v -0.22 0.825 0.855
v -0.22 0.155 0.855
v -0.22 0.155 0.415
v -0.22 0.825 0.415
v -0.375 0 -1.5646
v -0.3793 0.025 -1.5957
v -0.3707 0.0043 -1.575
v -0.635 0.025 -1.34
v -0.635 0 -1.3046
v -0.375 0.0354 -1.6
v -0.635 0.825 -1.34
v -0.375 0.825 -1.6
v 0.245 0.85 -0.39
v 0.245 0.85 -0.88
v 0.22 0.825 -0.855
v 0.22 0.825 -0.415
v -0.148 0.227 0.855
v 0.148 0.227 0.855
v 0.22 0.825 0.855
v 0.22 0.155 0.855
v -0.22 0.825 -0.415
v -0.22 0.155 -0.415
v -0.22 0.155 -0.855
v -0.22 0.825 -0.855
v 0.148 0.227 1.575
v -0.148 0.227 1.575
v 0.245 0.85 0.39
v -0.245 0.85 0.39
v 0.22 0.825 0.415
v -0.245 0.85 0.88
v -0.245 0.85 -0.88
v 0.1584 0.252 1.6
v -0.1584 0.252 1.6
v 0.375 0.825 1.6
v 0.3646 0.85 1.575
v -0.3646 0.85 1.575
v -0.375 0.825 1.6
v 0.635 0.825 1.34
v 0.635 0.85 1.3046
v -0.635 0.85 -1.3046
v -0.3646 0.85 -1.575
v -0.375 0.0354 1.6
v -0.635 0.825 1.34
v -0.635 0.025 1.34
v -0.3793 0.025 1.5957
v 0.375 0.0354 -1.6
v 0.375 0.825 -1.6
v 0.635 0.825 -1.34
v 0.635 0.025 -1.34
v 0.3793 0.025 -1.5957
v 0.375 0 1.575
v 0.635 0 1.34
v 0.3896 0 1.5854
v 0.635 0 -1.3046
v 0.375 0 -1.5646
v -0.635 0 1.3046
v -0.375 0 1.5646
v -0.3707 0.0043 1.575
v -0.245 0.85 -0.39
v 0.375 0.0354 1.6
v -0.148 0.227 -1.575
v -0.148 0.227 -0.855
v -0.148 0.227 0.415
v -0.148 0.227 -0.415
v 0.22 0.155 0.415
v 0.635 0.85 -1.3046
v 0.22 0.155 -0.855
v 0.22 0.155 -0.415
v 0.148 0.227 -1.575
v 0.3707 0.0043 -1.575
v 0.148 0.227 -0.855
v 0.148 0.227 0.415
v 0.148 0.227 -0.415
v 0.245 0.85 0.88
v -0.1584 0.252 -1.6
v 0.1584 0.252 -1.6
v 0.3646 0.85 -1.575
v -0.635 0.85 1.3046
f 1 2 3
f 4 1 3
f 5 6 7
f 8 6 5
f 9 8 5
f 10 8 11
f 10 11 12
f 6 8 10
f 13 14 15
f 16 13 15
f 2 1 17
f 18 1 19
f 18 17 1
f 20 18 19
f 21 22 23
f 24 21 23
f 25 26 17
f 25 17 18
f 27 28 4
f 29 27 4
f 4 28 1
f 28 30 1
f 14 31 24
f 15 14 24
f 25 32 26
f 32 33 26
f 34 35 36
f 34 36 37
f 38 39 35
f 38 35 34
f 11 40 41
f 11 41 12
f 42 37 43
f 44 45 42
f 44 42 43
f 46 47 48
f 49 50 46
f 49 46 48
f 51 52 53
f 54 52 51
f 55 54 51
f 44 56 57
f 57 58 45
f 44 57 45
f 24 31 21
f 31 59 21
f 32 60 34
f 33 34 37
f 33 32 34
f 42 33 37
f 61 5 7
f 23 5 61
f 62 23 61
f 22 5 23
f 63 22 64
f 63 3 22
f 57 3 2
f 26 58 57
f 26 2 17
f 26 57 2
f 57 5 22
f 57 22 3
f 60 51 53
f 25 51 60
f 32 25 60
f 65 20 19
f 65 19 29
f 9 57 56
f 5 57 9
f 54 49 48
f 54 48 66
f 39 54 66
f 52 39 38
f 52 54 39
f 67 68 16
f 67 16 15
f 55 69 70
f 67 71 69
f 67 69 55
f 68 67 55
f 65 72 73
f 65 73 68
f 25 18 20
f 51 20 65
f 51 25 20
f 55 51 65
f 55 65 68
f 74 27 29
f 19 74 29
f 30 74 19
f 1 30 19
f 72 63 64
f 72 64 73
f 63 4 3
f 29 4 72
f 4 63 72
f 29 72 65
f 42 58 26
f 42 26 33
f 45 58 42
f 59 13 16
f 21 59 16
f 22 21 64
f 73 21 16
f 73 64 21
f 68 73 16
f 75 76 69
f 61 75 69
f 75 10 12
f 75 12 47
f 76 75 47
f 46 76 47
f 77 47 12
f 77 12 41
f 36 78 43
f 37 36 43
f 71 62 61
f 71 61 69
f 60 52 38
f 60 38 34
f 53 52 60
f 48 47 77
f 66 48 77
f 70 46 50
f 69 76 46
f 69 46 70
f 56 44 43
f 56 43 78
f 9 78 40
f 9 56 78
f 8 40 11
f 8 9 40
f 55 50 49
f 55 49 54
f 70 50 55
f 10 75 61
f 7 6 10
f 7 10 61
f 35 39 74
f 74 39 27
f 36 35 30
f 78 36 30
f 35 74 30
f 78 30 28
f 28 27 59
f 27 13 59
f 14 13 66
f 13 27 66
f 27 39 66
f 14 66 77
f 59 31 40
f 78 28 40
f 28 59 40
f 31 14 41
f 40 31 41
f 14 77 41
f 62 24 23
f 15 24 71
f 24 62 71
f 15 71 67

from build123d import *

# Parameters (mm, degrees)
SKETCH5_W           = 0.44
SKETCH5_H           = 0.44
BOSS_EXTRUDE1_DEPTH = 0.85
CUT_EXTRUDE1_REACH  = 5.371
CHAMFER1_SIZE       = 0.025


with BuildPart() as part:
    # Sketch5 → Boss-Extrude1 (new body)
    with BuildSketch(Plane(origin=(0, 0, 0), x_dir=(1, 0, 0), z_dir=(0, 1, 0))):
        Polygon((-0.375, 1.6), (0.375, 1.6), (0.635, 1.34), (0.635, -1.34), (0.375, -1.6), (-0.375, -1.6), (-0.635, -1.34), (-0.635, 1.34), align=None)
        with Locations((0, 0.635)):
            Rectangle(SKETCH5_W, SKETCH5_H, mode=Mode.SUBTRACT)
        with Locations((0, -0.635)):
            Rectangle(SKETCH5_W, SKETCH5_H, mode=Mode.SUBTRACT)
    extrude(amount=BOSS_EXTRUDE1_DEPTH)

    # Cut-Extrude1: up to this face of the body (flat: up to its plane)
    cut_extrude1_end = Plane(part.part.faces().sort_by_distance((0, 0.425, -1.6))[0])
    # Sketch6 → Cut-Extrude1 (cut, up to the picked face)
    with BuildSketch(Plane.XY.offset(1.6), mode=Mode.PRIVATE) as cut_extrude1_sk1:
        Polygon((-0.375, 0), (-0.148, 0.227), (0.148, 0.227), (0.375, 0), align=None)
    cut_extrude1_tool1 = split(extrude(cut_extrude1_sk1.sketch, amount=-CUT_EXTRUDE1_REACH, mode=Mode.PRIVATE), bisect_by=cut_extrude1_end, keep=Keep.BOTH, mode=Mode.PRIVATE)
    add(cut_extrude1_tool1.solids().sort_by(Axis((0, 0.097079, 1.6), (0, 0, -1)))[0], mode=Mode.SUBTRACT)

    # Chamfer1
    # the kernel refuses this chamfer: 0.025 mm, written as the material it takes off along each edge
    with BuildSketch(Plane(origin=(-0.329538638, 0, 1.645461362), x_dir=(0.7068394360706735, -0.027495876610586514, -0.7068394360706735), z_dir=(-0.7071067811865476, 0, -0.7071067811865476)), Plane(origin=(0.329538638, 0.85, -1.645461362), x_dir=(0.019442520806015277, -0.9996219169112966, -0.01944252080601526), z_dir=(0.7071067811865472, 0, 0.7071067811865479))) as chamfer1_piece_1:
        Polygon((CHAMFER1_SIZE * 0.999621916911, -CHAMFER1_SIZE * 0.0274958766106), (-CHAMFER1_SIZE * 0.0274958766106, -CHAMFER1_SIZE * 0.999621916911), (0, 0), align=None)
    extrude(amount=0.496279676, mode=Mode.SUBTRACT)
    with BuildSketch(Plane(origin=(-0.680461362, 0, -1.294538638), x_dir=(-0.01944252080601428, 0.9996219169112966, -0.019442520806014163), z_dir=(0.7071067811865455, 0, -0.7071067811865497)), Plane(origin=(-0.329538638, 0.85, 1.645461362), x_dir=(0.7068394360706735, 0.027495876610587406, -0.7068394360706735), z_dir=(-0.7071067811865476, 0, -0.7071067811865476)), Plane(origin=(0.680461362, 0.85, 1.294538638), x_dir=(-0.7068394360706735, 0.02749587661058749, -0.7068394360706735), z_dir=(-0.7071067811865476, 0, 0.7071067811865476)), Plane(origin=(-0.680461362, 0.85, -1.294538638), x_dir=(0.7068394360706755, 0.02749587661058732, 0.7068394360706715), z_dir=(0.7071067811865455, 0, -0.7071067811865497)), Plane(origin=(0.329538638, 0, -1.645461362), x_dir=(0.019442520806010995, 0.9996219169112968, -0.019442520806010978), z_dir=(0.7071067811865472, 0, 0.7071067811865479))) as chamfer1_piece_2:
        Polygon((CHAMFER1_SIZE * 0.999621916911, CHAMFER1_SIZE * 0.0274958766106), (-CHAMFER1_SIZE * 0.0274958766106, CHAMFER1_SIZE * 0.999621916911), (0, 0), align=None)
    extrude(amount=0.496279676, mode=Mode.SUBTRACT)
    with BuildSketch(Plane(origin=(0.439292075, 0.85, 1.6), x_dir=(0, 0.02749587661058742, -0.9996219169112966), z_dir=(-1, 0, 0))) as chamfer1_piece_3:
        Polygon((CHAMFER1_SIZE * 0.999621916911, CHAMFER1_SIZE * 0.0274958766106), (-CHAMFER1_SIZE * 0.0274958766106, CHAMFER1_SIZE * 0.999621916911), (0, 0), align=None)
    extrude(amount=0.878584149, mode=Mode.SUBTRACT)
    with BuildSketch(Plane(origin=(0.22, 0.85, -0.855), x_dir=(0.9996219169112966, 0.02749587661058736, 0), z_dir=(0, 0, 1)), Plane(origin=(-0.22, 0.85, -0.855), x_dir=(0, 0.027495876610587302, -0.9996219169112966), z_dir=(1, 0, 0)), Plane(origin=(-0.22, 0.85, -0.415), x_dir=(-0.9996219169112966, 0.02749587661058736, 0), z_dir=(0, 0, -1)), Plane(origin=(0.22, 0.85, -0.415), x_dir=(0, 0.027495876610587302, 0.9996219169112966), z_dir=(-1, 0, 0)), Plane(origin=(-0.22, 0.85, 0.855), x_dir=(-0.9996219169112966, 0.02749587661058736, 0), z_dir=(0, 0, -1)), Plane(origin=(0.22, 0.85, 0.855), x_dir=(0, 0.027495876610587302, 0.9996219169112966), z_dir=(-1, 0, 0)), Plane(origin=(0.22, 0.85, 0.415), x_dir=(0.9996219169112966, 0.02749587661058736, 0), z_dir=(0, 0, 1)), Plane(origin=(-0.22, 0.85, 0.415), x_dir=(0, 0.027495876610587302, -0.9996219169112966), z_dir=(1, 0, 0))) as chamfer1_piece_4:
        Polygon((CHAMFER1_SIZE * 0.999621916911, -CHAMFER1_SIZE * 0.0274958766106), (-CHAMFER1_SIZE * 0.0274958766106, -CHAMFER1_SIZE * 0.999621916911), (0, 0), align=None)
    extrude(amount=0.44, mode=Mode.SUBTRACT)
    with BuildSketch(Plane(origin=(-0.439292075, 0.85, -1.6), x_dir=(0, -0.9996219169112966, -0.027495876610587302), z_dir=(1, 0, 0))) as chamfer1_piece_5:
        Polygon((CHAMFER1_SIZE * 0.999621916911, -CHAMFER1_SIZE * 0.0274958766106), (-CHAMFER1_SIZE * 0.0274958766106, -CHAMFER1_SIZE * 0.999621916911), (0, 0), align=None)
    extrude(amount=0.878584149, mode=Mode.SUBTRACT)
    with BuildSketch(Plane(origin=(0.102538638, 0.272461362, 1.6), x_dir=(-0.019442520806014184, -0.01944252080601436, -0.9996219169112966), z_dir=(0.7071067811865508, -0.7071067811865442, 0))) as chamfer1_piece_6_section:
        Polygon((CHAMFER1_SIZE * 0.999621916911, CHAMFER1_SIZE * 0.0274958766106), (-CHAMFER1_SIZE * 0.0274958766106, CHAMFER1_SIZE * 0.999621916911), (0, 0), align=None)
    chamfer1_piece_6 = extrude(amount=0.449610628, mode=Mode.PRIVATE)
    chamfer1_piece_6 = split(chamfer1_piece_6, bisect_by=Plane(origin=(0.292864015, 0.227, 1.591698889), z_dir=(0, -1, 0)), keep=Keep.TOP, mode=Mode.PRIVATE)
    add(chamfer1_piece_6, mode=Mode.SUBTRACT)
    with BuildSketch(Plane(origin=(-0.212292075, 0.227, 1.6), x_dir=(0, 0.9996219169112966, 0.02749587661058733), z_dir=(1, 0, 0))) as chamfer1_piece_7_section:
        Polygon((CHAMFER1_SIZE * 0.999621916911, -CHAMFER1_SIZE * 0.0274958766106), (-CHAMFER1_SIZE * 0.0274958766106, -CHAMFER1_SIZE * 0.999621916911), (0, 0), align=None)
    chamfer1_piece_7 = extrude(amount=0.424584149, mode=Mode.PRIVATE)
    chamfer1_piece_7 = split(chamfer1_piece_7, bisect_by=Plane(origin=(-0.070019575, 0.304980425, 1.591603337), z_dir=(0.707106781186544, -0.7071067811865511, 0)), keep=Keep.TOP, mode=Mode.PRIVATE)
    chamfer1_piece_7 = split(chamfer1_piece_7, bisect_by=Plane(origin=(0.070019575, 0.304980425, 1.591603337), z_dir=(-0.7071067811865442, -0.7071067811865508, 0)), keep=Keep.TOP, mode=Mode.PRIVATE)
    add(chamfer1_piece_7, mode=Mode.SUBTRACT)
    with BuildSketch(Plane(origin=(-0.420461362, -0.045461362, 1.6), x_dir=(0.019442520806013903, -0.019442520806014097, -0.9996219169112966), z_dir=(0.7071067811865511, 0.707106781186544, 0))) as chamfer1_piece_8_section:
        Polygon((CHAMFER1_SIZE * 0.999621916911, CHAMFER1_SIZE * 0.0274958766106), (-CHAMFER1_SIZE * 0.0274958766106, CHAMFER1_SIZE * 0.999621916911), (0, 0), align=None)
    chamfer1_piece_8 = extrude(amount=0.449610628, mode=Mode.PRIVATE)
    chamfer1_piece_8 = split(chamfer1_piece_8, bisect_by=Plane(origin=(-0.292864015, 0.227, 1.591698889), z_dir=(0, -1, 0)), keep=Keep.TOP, mode=Mode.PRIVATE)
    add(chamfer1_piece_8, mode=Mode.SUBTRACT)
    with BuildSketch(Plane(origin=(-0.420461362, -0.045461362, -1.6), x_dir=(-0.7068394360706672, 0.7068394360706742, -0.02749587661072924), z_dir=(0.7071067811865511, 0.707106781186544, 0))) as chamfer1_piece_9_section:
        Polygon((CHAMFER1_SIZE * 0.999621916911, CHAMFER1_SIZE * 0.0274958766107), (-CHAMFER1_SIZE * 0.0274958766006, CHAMFER1_SIZE * 0.999621916912), (0, 0), align=None)
    chamfer1_piece_9 = extrude(amount=0.449610628, mode=Mode.PRIVATE)
    chamfer1_piece_9 = split(chamfer1_piece_9, bisect_by=Plane(origin=(-0.292864015, 0.227, -1.591698889), z_dir=(0, -1, 0)), keep=Keep.TOP, mode=Mode.PRIVATE)
    add(chamfer1_piece_9, mode=Mode.SUBTRACT)
    with BuildSketch(Plane(origin=(-0.212292075, 0.227, -1.6), x_dir=(0, 0.9996219169112966, -0.02749587661058733), z_dir=(1, 0, 0))) as chamfer1_piece_10_section:
        Polygon((CHAMFER1_SIZE * 0.999621916911, CHAMFER1_SIZE * 0.0274958766106), (-CHAMFER1_SIZE * 0.0274958766106, CHAMFER1_SIZE * 0.999621916911), (0, 0), align=None)
    chamfer1_piece_10 = extrude(amount=0.424584149, mode=Mode.PRIVATE)
    chamfer1_piece_10 = split(chamfer1_piece_10, bisect_by=Plane(origin=(-0.070019575, 0.304980425, -1.591603337), z_dir=(0.707106781186544, -0.7071067811865511, 0)), keep=Keep.TOP, mode=Mode.PRIVATE)
    chamfer1_piece_10 = split(chamfer1_piece_10, bisect_by=Plane(origin=(0.070019575, 0.304980425, -1.591603337), z_dir=(-0.7071067811865442, -0.7071067811865508, 0)), keep=Keep.TOP, mode=Mode.PRIVATE)
    add(chamfer1_piece_10, mode=Mode.SUBTRACT)
    with BuildSketch(Plane(origin=(0.102538638, 0.272461362, -1.6), x_dir=(0.7068394360706932, 0.7068394360706998, -0.027495876609399512), z_dir=(0.7071067811865508, -0.7071067811865442, 0))) as chamfer1_piece_11_section:
        Polygon((CHAMFER1_SIZE * 0.999621916911, CHAMFER1_SIZE * 0.0274958766094), (-CHAMFER1_SIZE * 0.0274958766932, CHAMFER1_SIZE * 0.999621916909), (0, 0), align=None)
    chamfer1_piece_11 = extrude(amount=0.449610628, mode=Mode.PRIVATE)
    chamfer1_piece_11 = split(chamfer1_piece_11, bisect_by=Plane(origin=(0.292864015, 0.227, -1.591698889), z_dir=(0, -1, 0)), keep=Keep.TOP, mode=Mode.PRIVATE)
    add(chamfer1_piece_11, mode=Mode.SUBTRACT)
    with BuildSketch(Plane(origin=(0.22, 0.85, -0.919292075), x_dir=(0.9996219169112966, 0.02749587661058736, 0), z_dir=(0, 0, 1))) as chamfer1_piece_12a_section:
        Polygon((CHAMFER1_SIZE * 0.999621916911, -CHAMFER1_SIZE * 0.0274958766106), (-CHAMFER1_SIZE * 0.0274958766106, -CHAMFER1_SIZE * 0.999621916911), (0, 0), align=None)
    chamfer1_piece_12a = extrude(amount=0.504292075, mode=Mode.PRIVATE)
    chamfer1_piece_12a = split(chamfer1_piece_12a, bisect_by=Plane(origin=(0.228244841, 0.841755159, -0.855), z_dir=(0, 0, -1)), keep=Keep.TOP, mode=Mode.PRIVATE)
    with BuildSketch(Plane(origin=(-0.22, 0.85, -0.855), x_dir=(0, 0.027495876610587302, -0.9996219169112966), z_dir=(1, 0, 0))) as chamfer1_piece_12b_section:
        Polygon((CHAMFER1_SIZE * 0.999621916911, -CHAMFER1_SIZE * 0.0274958766106), (-CHAMFER1_SIZE * 0.0274958766106, -CHAMFER1_SIZE * 0.999621916911), (0, 0), align=None)
    chamfer1_piece_12b = extrude(amount=0.504292075, mode=Mode.PRIVATE)
    chamfer1_piece_12b = split(chamfer1_piece_12b, bisect_by=Plane(origin=(0.22, 0.841755159, -0.863244841), z_dir=(1, 0, 0)), keep=Keep.TOP, mode=Mode.PRIVATE)
    chamfer1_piece_12 = chamfer1_piece_12a & chamfer1_piece_12b
    add(chamfer1_piece_12, mode=Mode.SUBTRACT)
    with BuildSketch(Plane(origin=(0.284292075, 0.85, -0.415), x_dir=(0, 0.027495876610587302, 0.9996219169112966), z_dir=(-1, 0, 0))) as chamfer1_piece_13a_section:
        Polygon((CHAMFER1_SIZE * 0.999621916911, -CHAMFER1_SIZE * 0.0274958766106), (-CHAMFER1_SIZE * 0.0274958766106, -CHAMFER1_SIZE * 0.999621916911), (0, 0), align=None)
    chamfer1_piece_13a = extrude(amount=0.504292075, mode=Mode.PRIVATE)
    chamfer1_piece_13a = split(chamfer1_piece_13a, bisect_by=Plane(origin=(0.22, 0.841755159, -0.406755159), z_dir=(1, 0, 0)), keep=Keep.TOP, mode=Mode.PRIVATE)
    with BuildSketch(Plane(origin=(0.22, 0.85, -0.855), x_dir=(0.9996219169112966, 0.02749587661058736, 0), z_dir=(0, 0, 1))) as chamfer1_piece_13b_section:
        Polygon((CHAMFER1_SIZE * 0.999621916911, -CHAMFER1_SIZE * 0.0274958766106), (-CHAMFER1_SIZE * 0.0274958766106, -CHAMFER1_SIZE * 0.999621916911), (0, 0), align=None)
    chamfer1_piece_13b = extrude(amount=0.504292075, mode=Mode.PRIVATE)
    chamfer1_piece_13b = split(chamfer1_piece_13b, bisect_by=Plane(origin=(0.228244841, 0.841755159, -0.415), z_dir=(0, 0, 1)), keep=Keep.TOP, mode=Mode.PRIVATE)
    chamfer1_piece_13 = chamfer1_piece_13a & chamfer1_piece_13b
    add(chamfer1_piece_13, mode=Mode.SUBTRACT)
    with BuildSketch(Plane(origin=(-0.22, 0.85, -0.415), x_dir=(-0.9996219169112966, 0.02749587661058736, 0), z_dir=(0, 0, -1))) as chamfer1_piece_14a_section:
        Polygon((CHAMFER1_SIZE * 0.999621916911, -CHAMFER1_SIZE * 0.0274958766106), (-CHAMFER1_SIZE * 0.0274958766106, -CHAMFER1_SIZE * 0.999621916911), (0, 0), align=None)
    chamfer1_piece_14a = extrude(amount=0.504292075, mode=Mode.PRIVATE)
    chamfer1_piece_14a = split(chamfer1_piece_14a, bisect_by=Plane(origin=(-0.228244841, 0.841755159, -0.855), z_dir=(0, 0, -1)), keep=Keep.TOP, mode=Mode.PRIVATE)
    with BuildSketch(Plane(origin=(-0.284292075, 0.85, -0.855), x_dir=(0, 0.027495876610587302, -0.9996219169112966), z_dir=(1, 0, 0))) as chamfer1_piece_14b_section:
        Polygon((CHAMFER1_SIZE * 0.999621916911, -CHAMFER1_SIZE * 0.0274958766106), (-CHAMFER1_SIZE * 0.0274958766106, -CHAMFER1_SIZE * 0.999621916911), (0, 0), align=None)
    chamfer1_piece_14b = extrude(amount=0.504292075, mode=Mode.PRIVATE)
    chamfer1_piece_14b = split(chamfer1_piece_14b, bisect_by=Plane(origin=(-0.22, 0.841755159, -0.863244841), z_dir=(-1, 0, 0)), keep=Keep.TOP, mode=Mode.PRIVATE)
    chamfer1_piece_14 = chamfer1_piece_14a & chamfer1_piece_14b
    add(chamfer1_piece_14, mode=Mode.SUBTRACT)
    with BuildSketch(Plane(origin=(-0.22, 0.85, -0.350707925), x_dir=(-0.9996219169112966, 0.02749587661058736, 0), z_dir=(0, 0, -1))) as chamfer1_piece_15a_section:
        Polygon((CHAMFER1_SIZE * 0.999621916911, -CHAMFER1_SIZE * 0.0274958766106), (-CHAMFER1_SIZE * 0.0274958766106, -CHAMFER1_SIZE * 0.999621916911), (0, 0), align=None)
    chamfer1_piece_15a = extrude(amount=0.504292075, mode=Mode.PRIVATE)
    chamfer1_piece_15a = split(chamfer1_piece_15a, bisect_by=Plane(origin=(-0.228244841, 0.841755159, -0.415), z_dir=(0, 0, 1)), keep=Keep.TOP, mode=Mode.PRIVATE)
    with BuildSketch(Plane(origin=(0.22, 0.85, -0.415), x_dir=(0, 0.027495876610587302, 0.9996219169112966), z_dir=(-1, 0, 0))) as chamfer1_piece_15b_section:
        Polygon((CHAMFER1_SIZE * 0.999621916911, -CHAMFER1_SIZE * 0.0274958766106), (-CHAMFER1_SIZE * 0.0274958766106, -CHAMFER1_SIZE * 0.999621916911), (0, 0), align=None)
    chamfer1_piece_15b = extrude(amount=0.504292075, mode=Mode.PRIVATE)
    chamfer1_piece_15b = split(chamfer1_piece_15b, bisect_by=Plane(origin=(-0.22, 0.841755159, -0.406755159), z_dir=(-1, 0, 0)), keep=Keep.TOP, mode=Mode.PRIVATE)
    chamfer1_piece_15 = chamfer1_piece_15a & chamfer1_piece_15b
    add(chamfer1_piece_15, mode=Mode.SUBTRACT)
    with BuildSketch(Plane(origin=(-0.22, 0.85, 0.919292075), x_dir=(-0.9996219169112966, 0.02749587661058736, 0), z_dir=(0, 0, -1))) as chamfer1_piece_16a_section:
        Polygon((CHAMFER1_SIZE * 0.999621916911, -CHAMFER1_SIZE * 0.0274958766106), (-CHAMFER1_SIZE * 0.0274958766106, -CHAMFER1_SIZE * 0.999621916911), (0, 0), align=None)
    chamfer1_piece_16a = extrude(amount=0.504292075, mode=Mode.PRIVATE)
    chamfer1_piece_16a = split(chamfer1_piece_16a, bisect_by=Plane(origin=(-0.228244841, 0.841755159, 0.855), z_dir=(0, 0, 1)), keep=Keep.TOP, mode=Mode.PRIVATE)
    with BuildSketch(Plane(origin=(0.22, 0.85, 0.855), x_dir=(0, 0.027495876610587302, 0.9996219169112966), z_dir=(-1, 0, 0))) as chamfer1_piece_16b_section:
        Polygon((CHAMFER1_SIZE * 0.999621916911, -CHAMFER1_SIZE * 0.0274958766106), (-CHAMFER1_SIZE * 0.0274958766106, -CHAMFER1_SIZE * 0.999621916911), (0, 0), align=None)
    chamfer1_piece_16b = extrude(amount=0.504292075, mode=Mode.PRIVATE)
    chamfer1_piece_16b = split(chamfer1_piece_16b, bisect_by=Plane(origin=(-0.22, 0.841755159, 0.863244841), z_dir=(-1, 0, 0)), keep=Keep.TOP, mode=Mode.PRIVATE)
    chamfer1_piece_16 = chamfer1_piece_16a & chamfer1_piece_16b
    add(chamfer1_piece_16, mode=Mode.SUBTRACT)
    with BuildSketch(Plane(origin=(-0.22, 0.85, 0.855), x_dir=(-0.9996219169112966, 0.02749587661058736, 0), z_dir=(0, 0, -1))) as chamfer1_piece_17a_section:
        Polygon((CHAMFER1_SIZE * 0.999621916911, -CHAMFER1_SIZE * 0.0274958766106), (-CHAMFER1_SIZE * 0.0274958766106, -CHAMFER1_SIZE * 0.999621916911), (0, 0), align=None)
    chamfer1_piece_17a = extrude(amount=0.504292075, mode=Mode.PRIVATE)
    chamfer1_piece_17a = split(chamfer1_piece_17a, bisect_by=Plane(origin=(-0.228244841, 0.841755159, 0.415), z_dir=(0, 0, -1)), keep=Keep.TOP, mode=Mode.PRIVATE)
    with BuildSketch(Plane(origin=(-0.284292075, 0.85, 0.415), x_dir=(0, 0.027495876610587302, -0.9996219169112966), z_dir=(1, 0, 0))) as chamfer1_piece_17b_section:
        Polygon((CHAMFER1_SIZE * 0.999621916911, -CHAMFER1_SIZE * 0.0274958766106), (-CHAMFER1_SIZE * 0.0274958766106, -CHAMFER1_SIZE * 0.999621916911), (0, 0), align=None)
    chamfer1_piece_17b = extrude(amount=0.504292075, mode=Mode.PRIVATE)
    chamfer1_piece_17b = split(chamfer1_piece_17b, bisect_by=Plane(origin=(-0.22, 0.841755159, 0.406755159), z_dir=(-1, 0, 0)), keep=Keep.TOP, mode=Mode.PRIVATE)
    chamfer1_piece_17 = chamfer1_piece_17a & chamfer1_piece_17b
    add(chamfer1_piece_17, mode=Mode.SUBTRACT)
    with BuildSketch(Plane(origin=(0.284292075, 0.85, 0.855), x_dir=(0, 0.027495876610587302, 0.9996219169112966), z_dir=(-1, 0, 0))) as chamfer1_piece_18a_section:
        Polygon((CHAMFER1_SIZE * 0.999621916911, -CHAMFER1_SIZE * 0.0274958766106), (-CHAMFER1_SIZE * 0.0274958766106, -CHAMFER1_SIZE * 0.999621916911), (0, 0), align=None)
    chamfer1_piece_18a = extrude(amount=0.504292075, mode=Mode.PRIVATE)
    chamfer1_piece_18a = split(chamfer1_piece_18a, bisect_by=Plane(origin=(0.22, 0.841755159, 0.863244841), z_dir=(1, 0, 0)), keep=Keep.TOP, mode=Mode.PRIVATE)
    with BuildSketch(Plane(origin=(0.22, 0.85, 0.415), x_dir=(0.9996219169112966, 0.02749587661058736, 0), z_dir=(0, 0, 1))) as chamfer1_piece_18b_section:
        Polygon((CHAMFER1_SIZE * 0.999621916911, -CHAMFER1_SIZE * 0.0274958766106), (-CHAMFER1_SIZE * 0.0274958766106, -CHAMFER1_SIZE * 0.999621916911), (0, 0), align=None)
    chamfer1_piece_18b = extrude(amount=0.504292075, mode=Mode.PRIVATE)
    chamfer1_piece_18b = split(chamfer1_piece_18b, bisect_by=Plane(origin=(0.228244841, 0.841755159, 0.855), z_dir=(0, 0, 1)), keep=Keep.TOP, mode=Mode.PRIVATE)
    chamfer1_piece_18 = chamfer1_piece_18a & chamfer1_piece_18b
    add(chamfer1_piece_18, mode=Mode.SUBTRACT)
    with BuildSketch(Plane(origin=(0.22, 0.85, 0.350707925), x_dir=(0.9996219169112966, 0.02749587661058736, 0), z_dir=(0, 0, 1))) as chamfer1_piece_19a_section:
        Polygon((CHAMFER1_SIZE * 0.999621916911, -CHAMFER1_SIZE * 0.0274958766106), (-CHAMFER1_SIZE * 0.0274958766106, -CHAMFER1_SIZE * 0.999621916911), (0, 0), align=None)
    chamfer1_piece_19a = extrude(amount=0.504292075, mode=Mode.PRIVATE)
    chamfer1_piece_19a = split(chamfer1_piece_19a, bisect_by=Plane(origin=(0.228244841, 0.841755159, 0.415), z_dir=(0, 0, -1)), keep=Keep.TOP, mode=Mode.PRIVATE)
    with BuildSketch(Plane(origin=(-0.22, 0.85, 0.415), x_dir=(0, 0.027495876610587302, -0.9996219169112966), z_dir=(1, 0, 0))) as chamfer1_piece_19b_section:
        Polygon((CHAMFER1_SIZE * 0.999621916911, -CHAMFER1_SIZE * 0.0274958766106), (-CHAMFER1_SIZE * 0.0274958766106, -CHAMFER1_SIZE * 0.999621916911), (0, 0), align=None)
    chamfer1_piece_19b = extrude(amount=0.504292075, mode=Mode.PRIVATE)
    chamfer1_piece_19b = split(chamfer1_piece_19b, bisect_by=Plane(origin=(0.22, 0.841755159, 0.406755159), z_dir=(1, 0, 0)), keep=Keep.TOP, mode=Mode.PRIVATE)
    chamfer1_piece_19 = chamfer1_piece_19a & chamfer1_piece_19b
    add(chamfer1_piece_19, mode=Mode.SUBTRACT)
    with BuildSketch(Plane(origin=(0.102538638, 0.272461362, 1.6), x_dir=(-0.019442520806014184, -0.01944252080601436, -0.9996219169112966), z_dir=(0.7071067811865508, -0.7071067811865442, 0))) as chamfer1_piece_20a_section:
        Polygon((CHAMFER1_SIZE * 0.999621916911, CHAMFER1_SIZE * 0.0274958766106), (-CHAMFER1_SIZE * 0.0274958766106, CHAMFER1_SIZE * 0.999621916911), (0, 0), align=None)
    chamfer1_piece_20a = extrude(amount=0.449610628, mode=Mode.PRIVATE)
    chamfer1_piece_20a = split(chamfer1_piece_20a, bisect_by=Plane(origin=(0.134594641, 0.227, 1.592047672), z_dir=(0, 1, 0)), keep=Keep.TOP, mode=Mode.PRIVATE)
    with BuildSketch(Plane(origin=(-0.212292075, 0.227, 1.6), x_dir=(0, 0.9996219169112966, 0.02749587661058733), z_dir=(1, 0, 0))) as chamfer1_piece_20b_section:
        Polygon((CHAMFER1_SIZE * 0.999621916911, -CHAMFER1_SIZE * 0.0274958766106), (-CHAMFER1_SIZE * 0.0274958766106, -CHAMFER1_SIZE * 0.999621916911), (0, 0), align=None)
    chamfer1_piece_20b = extrude(amount=0.424584149, mode=Mode.PRIVATE)
    chamfer1_piece_20b = split(chamfer1_piece_20b, bisect_by=Plane(origin=(0.15747902, 0.21752098, 1.592047672), z_dir=(0.7071067811865442, 0.7071067811865508, 0)), keep=Keep.TOP, mode=Mode.PRIVATE)
    chamfer1_piece_20 = chamfer1_piece_20a & chamfer1_piece_20b
    add(chamfer1_piece_20, mode=Mode.SUBTRACT)
    with BuildSketch(Plane(origin=(-0.420461362, -0.045461362, 1.6), x_dir=(0.019442520806013903, -0.019442520806014097, -0.9996219169112966), z_dir=(0.7071067811865511, 0.707106781186544, 0))) as chamfer1_piece_21a_section:
        Polygon((CHAMFER1_SIZE * 0.999621916911, CHAMFER1_SIZE * 0.0274958766106), (-CHAMFER1_SIZE * 0.0274958766106, CHAMFER1_SIZE * 0.999621916911), (0, 0), align=None)
    chamfer1_piece_21a = extrude(amount=0.449610628, mode=Mode.PRIVATE)
    chamfer1_piece_21a = split(chamfer1_piece_21a, bisect_by=Plane(origin=(-0.134594641, 0.227, 1.592047672), z_dir=(0, 1, 0)), keep=Keep.TOP, mode=Mode.PRIVATE)
    with BuildSketch(Plane(origin=(-0.212292075, 0.227, 1.6), x_dir=(0, 0.9996219169112966, 0.02749587661058733), z_dir=(1, 0, 0))) as chamfer1_piece_21b_section:
        Polygon((CHAMFER1_SIZE * 0.999621916911, -CHAMFER1_SIZE * 0.0274958766106), (-CHAMFER1_SIZE * 0.0274958766106, -CHAMFER1_SIZE * 0.999621916911), (0, 0), align=None)
    chamfer1_piece_21b = extrude(amount=0.424584149, mode=Mode.PRIVATE)
    chamfer1_piece_21b = split(chamfer1_piece_21b, bisect_by=Plane(origin=(-0.15747902, 0.21752098, 1.592047672), z_dir=(-0.707106781186544, 0.7071067811865511, 0)), keep=Keep.TOP, mode=Mode.PRIVATE)
    chamfer1_piece_21 = chamfer1_piece_21a & chamfer1_piece_21b
    add(chamfer1_piece_21, mode=Mode.SUBTRACT)
    with BuildSketch(Plane(origin=(-0.420461362, -0.045461362, -1.6), x_dir=(-0.7068394360706672, 0.7068394360706742, -0.02749587661072924), z_dir=(0.7071067811865511, 0.707106781186544, 0))) as chamfer1_piece_22a_section:
        Polygon((CHAMFER1_SIZE * 0.999621916911, CHAMFER1_SIZE * 0.0274958766107), (-CHAMFER1_SIZE * 0.0274958766006, CHAMFER1_SIZE * 0.999621916912), (0, 0), align=None)
    chamfer1_piece_22a = extrude(amount=0.449610628, mode=Mode.PRIVATE)
    chamfer1_piece_22a = split(chamfer1_piece_22a, bisect_by=Plane(origin=(-0.134594641, 0.227, -1.592047672), z_dir=(0, 1, 0)), keep=Keep.TOP, mode=Mode.PRIVATE)
    with BuildSketch(Plane(origin=(-0.212292075, 0.227, -1.6), x_dir=(0, 0.9996219169112966, -0.02749587661058733), z_dir=(1, 0, 0))) as chamfer1_piece_22b_section:
        Polygon((CHAMFER1_SIZE * 0.999621916911, CHAMFER1_SIZE * 0.0274958766106), (-CHAMFER1_SIZE * 0.0274958766106, CHAMFER1_SIZE * 0.999621916911), (0, 0), align=None)
    chamfer1_piece_22b = extrude(amount=0.424584149, mode=Mode.PRIVATE)
    chamfer1_piece_22b = split(chamfer1_piece_22b, bisect_by=Plane(origin=(-0.15747902, 0.21752098, -1.592047672), z_dir=(-0.707106781186544, 0.7071067811865511, 0)), keep=Keep.TOP, mode=Mode.PRIVATE)
    chamfer1_piece_22 = chamfer1_piece_22a & chamfer1_piece_22b
    add(chamfer1_piece_22, mode=Mode.SUBTRACT)
    with BuildSketch(Plane(origin=(-0.212292075, 0.227, -1.6), x_dir=(0, 0.9996219169112966, -0.02749587661058733), z_dir=(1, 0, 0))) as chamfer1_piece_23a_section:
        Polygon((CHAMFER1_SIZE * 0.999621916911, CHAMFER1_SIZE * 0.0274958766106), (-CHAMFER1_SIZE * 0.0274958766106, CHAMFER1_SIZE * 0.999621916911), (0, 0), align=None)
    chamfer1_piece_23a = extrude(amount=0.424584149, mode=Mode.PRIVATE)
    chamfer1_piece_23a = split(chamfer1_piece_23a, bisect_by=Plane(origin=(0.15747902, 0.21752098, -1.592047672), z_dir=(0.7071067811865442, 0.7071067811865508, 0)), keep=Keep.TOP, mode=Mode.PRIVATE)
    with BuildSketch(Plane(origin=(0.102538638, 0.272461362, -1.6), x_dir=(0.7068394360706932, 0.7068394360706998, -0.027495876609399512), z_dir=(0.7071067811865508, -0.7071067811865442, 0))) as chamfer1_piece_23b_section:
        Polygon((CHAMFER1_SIZE * 0.999621916911, CHAMFER1_SIZE * 0.0274958766094), (-CHAMFER1_SIZE * 0.0274958766932, CHAMFER1_SIZE * 0.999621916909), (0, 0), align=None)
    chamfer1_piece_23b = extrude(amount=0.449610628, mode=Mode.PRIVATE)
    chamfer1_piece_23b = split(chamfer1_piece_23b, bisect_by=Plane(origin=(0.134594641, 0.227, -1.592047672), z_dir=(0, 1, 0)), keep=Keep.TOP, mode=Mode.PRIVATE)
    chamfer1_piece_23 = chamfer1_piece_23a & chamfer1_piece_23b
    add(chamfer1_piece_23, mode=Mode.SUBTRACT)


solid = part.part
